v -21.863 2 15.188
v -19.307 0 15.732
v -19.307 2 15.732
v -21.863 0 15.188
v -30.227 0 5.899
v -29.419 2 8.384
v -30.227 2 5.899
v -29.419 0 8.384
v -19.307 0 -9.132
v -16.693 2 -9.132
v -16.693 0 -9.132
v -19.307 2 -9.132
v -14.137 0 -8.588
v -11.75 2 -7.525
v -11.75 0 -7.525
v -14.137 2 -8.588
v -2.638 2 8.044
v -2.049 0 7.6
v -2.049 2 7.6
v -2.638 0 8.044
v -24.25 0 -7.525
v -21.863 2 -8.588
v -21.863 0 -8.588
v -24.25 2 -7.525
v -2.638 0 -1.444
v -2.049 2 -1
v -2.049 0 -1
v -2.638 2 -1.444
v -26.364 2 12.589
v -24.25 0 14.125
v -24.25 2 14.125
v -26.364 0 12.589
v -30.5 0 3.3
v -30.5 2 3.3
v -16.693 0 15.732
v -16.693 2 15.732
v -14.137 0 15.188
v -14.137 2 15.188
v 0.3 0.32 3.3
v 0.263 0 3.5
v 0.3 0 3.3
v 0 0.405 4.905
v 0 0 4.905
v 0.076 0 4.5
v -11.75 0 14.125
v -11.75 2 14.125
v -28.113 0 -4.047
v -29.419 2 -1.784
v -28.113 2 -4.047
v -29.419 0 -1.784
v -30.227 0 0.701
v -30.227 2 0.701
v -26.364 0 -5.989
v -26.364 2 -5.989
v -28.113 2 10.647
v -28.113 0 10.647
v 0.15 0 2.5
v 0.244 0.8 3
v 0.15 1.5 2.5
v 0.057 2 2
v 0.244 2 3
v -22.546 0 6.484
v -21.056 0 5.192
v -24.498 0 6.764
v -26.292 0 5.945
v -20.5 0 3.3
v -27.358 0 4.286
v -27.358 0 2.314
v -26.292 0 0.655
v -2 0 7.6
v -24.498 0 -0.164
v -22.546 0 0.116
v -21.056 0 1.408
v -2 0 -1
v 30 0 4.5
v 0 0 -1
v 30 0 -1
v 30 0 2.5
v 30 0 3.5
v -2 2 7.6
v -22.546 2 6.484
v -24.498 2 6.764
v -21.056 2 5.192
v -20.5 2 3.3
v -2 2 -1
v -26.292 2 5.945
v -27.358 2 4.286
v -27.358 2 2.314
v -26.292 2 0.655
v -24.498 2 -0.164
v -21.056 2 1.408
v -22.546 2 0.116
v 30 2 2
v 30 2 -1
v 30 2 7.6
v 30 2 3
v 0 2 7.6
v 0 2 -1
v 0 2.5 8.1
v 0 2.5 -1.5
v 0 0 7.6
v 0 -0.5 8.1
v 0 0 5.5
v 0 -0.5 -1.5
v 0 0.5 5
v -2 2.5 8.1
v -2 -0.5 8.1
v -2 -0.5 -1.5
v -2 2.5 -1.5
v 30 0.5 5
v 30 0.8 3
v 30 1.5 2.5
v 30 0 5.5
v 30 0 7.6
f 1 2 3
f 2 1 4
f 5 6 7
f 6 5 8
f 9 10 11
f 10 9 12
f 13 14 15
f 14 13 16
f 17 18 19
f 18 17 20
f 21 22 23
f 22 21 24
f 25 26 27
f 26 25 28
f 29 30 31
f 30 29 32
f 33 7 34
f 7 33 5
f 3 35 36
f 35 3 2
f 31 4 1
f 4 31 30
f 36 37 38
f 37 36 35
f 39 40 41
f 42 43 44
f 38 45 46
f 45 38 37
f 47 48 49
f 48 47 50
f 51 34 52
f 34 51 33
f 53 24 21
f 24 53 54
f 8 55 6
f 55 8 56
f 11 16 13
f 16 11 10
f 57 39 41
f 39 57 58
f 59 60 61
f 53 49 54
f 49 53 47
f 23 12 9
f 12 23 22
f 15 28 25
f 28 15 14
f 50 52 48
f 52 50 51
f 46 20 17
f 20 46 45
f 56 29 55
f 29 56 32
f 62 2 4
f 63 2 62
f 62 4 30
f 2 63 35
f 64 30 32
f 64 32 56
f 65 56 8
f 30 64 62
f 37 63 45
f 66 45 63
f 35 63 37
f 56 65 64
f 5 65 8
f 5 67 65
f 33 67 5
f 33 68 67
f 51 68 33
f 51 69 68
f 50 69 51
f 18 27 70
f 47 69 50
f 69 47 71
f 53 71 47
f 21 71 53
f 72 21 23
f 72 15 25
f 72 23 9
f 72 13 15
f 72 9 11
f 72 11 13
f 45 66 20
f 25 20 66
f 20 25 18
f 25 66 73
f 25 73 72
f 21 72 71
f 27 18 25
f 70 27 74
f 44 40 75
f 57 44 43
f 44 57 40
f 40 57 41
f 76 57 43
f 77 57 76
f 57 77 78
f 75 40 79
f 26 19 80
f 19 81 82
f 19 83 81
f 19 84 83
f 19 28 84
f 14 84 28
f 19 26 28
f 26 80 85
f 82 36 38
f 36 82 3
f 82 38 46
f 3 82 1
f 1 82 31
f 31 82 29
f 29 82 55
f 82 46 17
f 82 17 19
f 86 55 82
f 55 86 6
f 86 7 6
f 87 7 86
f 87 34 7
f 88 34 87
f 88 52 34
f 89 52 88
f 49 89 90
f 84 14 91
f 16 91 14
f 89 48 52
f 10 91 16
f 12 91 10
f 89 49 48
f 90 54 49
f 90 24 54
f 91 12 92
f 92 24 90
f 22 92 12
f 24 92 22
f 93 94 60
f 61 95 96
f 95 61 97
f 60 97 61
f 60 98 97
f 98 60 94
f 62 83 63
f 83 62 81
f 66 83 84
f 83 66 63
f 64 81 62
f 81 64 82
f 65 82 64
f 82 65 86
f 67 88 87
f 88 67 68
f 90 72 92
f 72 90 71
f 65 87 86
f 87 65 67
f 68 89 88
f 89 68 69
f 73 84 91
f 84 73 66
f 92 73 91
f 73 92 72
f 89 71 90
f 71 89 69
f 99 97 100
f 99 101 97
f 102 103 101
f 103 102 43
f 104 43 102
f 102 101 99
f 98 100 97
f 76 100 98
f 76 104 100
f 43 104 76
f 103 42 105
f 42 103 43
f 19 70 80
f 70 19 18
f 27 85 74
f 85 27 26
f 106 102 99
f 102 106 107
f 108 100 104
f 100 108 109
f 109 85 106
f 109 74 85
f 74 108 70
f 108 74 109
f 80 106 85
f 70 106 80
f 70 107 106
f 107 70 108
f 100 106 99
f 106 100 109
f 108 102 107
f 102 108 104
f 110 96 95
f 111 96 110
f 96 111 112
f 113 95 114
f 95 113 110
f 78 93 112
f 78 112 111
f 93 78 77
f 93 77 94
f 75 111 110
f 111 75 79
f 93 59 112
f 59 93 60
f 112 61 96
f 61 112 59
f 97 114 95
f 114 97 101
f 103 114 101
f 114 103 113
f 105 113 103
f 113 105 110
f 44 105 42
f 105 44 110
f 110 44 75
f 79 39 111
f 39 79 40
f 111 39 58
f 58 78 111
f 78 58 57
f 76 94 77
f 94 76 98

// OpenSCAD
module kwikset_warding_profile() {
  polygon(points=[
    [0, 0], [2, 0], 
    [2, 3], [1.5, 3.5], [2, 4],
    [2, 8.6], 
    [0, 8.6], 
    [0, 6.5], [0.5, 6.0], [0, 5.5],
    [0, 4.5], [0.8, 4.0], [0, 3.5]
  ]);
}

module key_blank() {
  union() {
    // Realistic Bow (Head of the key)
    translate([-12, 1, 3.3])
    rotate([90, 0, 0])
    difference() {
      // Main rounded bow shape
      hull() {
        translate([7, 0, 0]) cylinder(r=5.3, h=2, center=true);
        translate([-6, 0, 0]) cylinder(r=12.5, h=2, center=true);
      }
      // Keyring hole
      translate([-12, 0, 0])
      cylinder(r=3.5, h=4, center=true);
    }
    
    // Neck (Connects bow to blade)
    translate([-5, 0, -1])
    cube([5, 2, 8.6]);
    
    // Shoulder Stop
    translate([-2, -0.5, -1.5])
    cube([2, 3, 9.6]);
    
    // Blade rendering
    translate([0, 0, -1])
    rotate([90, 0, 90])
    linear_extrude(height=30)
    kwikset_warding_profile();
  }
}

key_blank();
